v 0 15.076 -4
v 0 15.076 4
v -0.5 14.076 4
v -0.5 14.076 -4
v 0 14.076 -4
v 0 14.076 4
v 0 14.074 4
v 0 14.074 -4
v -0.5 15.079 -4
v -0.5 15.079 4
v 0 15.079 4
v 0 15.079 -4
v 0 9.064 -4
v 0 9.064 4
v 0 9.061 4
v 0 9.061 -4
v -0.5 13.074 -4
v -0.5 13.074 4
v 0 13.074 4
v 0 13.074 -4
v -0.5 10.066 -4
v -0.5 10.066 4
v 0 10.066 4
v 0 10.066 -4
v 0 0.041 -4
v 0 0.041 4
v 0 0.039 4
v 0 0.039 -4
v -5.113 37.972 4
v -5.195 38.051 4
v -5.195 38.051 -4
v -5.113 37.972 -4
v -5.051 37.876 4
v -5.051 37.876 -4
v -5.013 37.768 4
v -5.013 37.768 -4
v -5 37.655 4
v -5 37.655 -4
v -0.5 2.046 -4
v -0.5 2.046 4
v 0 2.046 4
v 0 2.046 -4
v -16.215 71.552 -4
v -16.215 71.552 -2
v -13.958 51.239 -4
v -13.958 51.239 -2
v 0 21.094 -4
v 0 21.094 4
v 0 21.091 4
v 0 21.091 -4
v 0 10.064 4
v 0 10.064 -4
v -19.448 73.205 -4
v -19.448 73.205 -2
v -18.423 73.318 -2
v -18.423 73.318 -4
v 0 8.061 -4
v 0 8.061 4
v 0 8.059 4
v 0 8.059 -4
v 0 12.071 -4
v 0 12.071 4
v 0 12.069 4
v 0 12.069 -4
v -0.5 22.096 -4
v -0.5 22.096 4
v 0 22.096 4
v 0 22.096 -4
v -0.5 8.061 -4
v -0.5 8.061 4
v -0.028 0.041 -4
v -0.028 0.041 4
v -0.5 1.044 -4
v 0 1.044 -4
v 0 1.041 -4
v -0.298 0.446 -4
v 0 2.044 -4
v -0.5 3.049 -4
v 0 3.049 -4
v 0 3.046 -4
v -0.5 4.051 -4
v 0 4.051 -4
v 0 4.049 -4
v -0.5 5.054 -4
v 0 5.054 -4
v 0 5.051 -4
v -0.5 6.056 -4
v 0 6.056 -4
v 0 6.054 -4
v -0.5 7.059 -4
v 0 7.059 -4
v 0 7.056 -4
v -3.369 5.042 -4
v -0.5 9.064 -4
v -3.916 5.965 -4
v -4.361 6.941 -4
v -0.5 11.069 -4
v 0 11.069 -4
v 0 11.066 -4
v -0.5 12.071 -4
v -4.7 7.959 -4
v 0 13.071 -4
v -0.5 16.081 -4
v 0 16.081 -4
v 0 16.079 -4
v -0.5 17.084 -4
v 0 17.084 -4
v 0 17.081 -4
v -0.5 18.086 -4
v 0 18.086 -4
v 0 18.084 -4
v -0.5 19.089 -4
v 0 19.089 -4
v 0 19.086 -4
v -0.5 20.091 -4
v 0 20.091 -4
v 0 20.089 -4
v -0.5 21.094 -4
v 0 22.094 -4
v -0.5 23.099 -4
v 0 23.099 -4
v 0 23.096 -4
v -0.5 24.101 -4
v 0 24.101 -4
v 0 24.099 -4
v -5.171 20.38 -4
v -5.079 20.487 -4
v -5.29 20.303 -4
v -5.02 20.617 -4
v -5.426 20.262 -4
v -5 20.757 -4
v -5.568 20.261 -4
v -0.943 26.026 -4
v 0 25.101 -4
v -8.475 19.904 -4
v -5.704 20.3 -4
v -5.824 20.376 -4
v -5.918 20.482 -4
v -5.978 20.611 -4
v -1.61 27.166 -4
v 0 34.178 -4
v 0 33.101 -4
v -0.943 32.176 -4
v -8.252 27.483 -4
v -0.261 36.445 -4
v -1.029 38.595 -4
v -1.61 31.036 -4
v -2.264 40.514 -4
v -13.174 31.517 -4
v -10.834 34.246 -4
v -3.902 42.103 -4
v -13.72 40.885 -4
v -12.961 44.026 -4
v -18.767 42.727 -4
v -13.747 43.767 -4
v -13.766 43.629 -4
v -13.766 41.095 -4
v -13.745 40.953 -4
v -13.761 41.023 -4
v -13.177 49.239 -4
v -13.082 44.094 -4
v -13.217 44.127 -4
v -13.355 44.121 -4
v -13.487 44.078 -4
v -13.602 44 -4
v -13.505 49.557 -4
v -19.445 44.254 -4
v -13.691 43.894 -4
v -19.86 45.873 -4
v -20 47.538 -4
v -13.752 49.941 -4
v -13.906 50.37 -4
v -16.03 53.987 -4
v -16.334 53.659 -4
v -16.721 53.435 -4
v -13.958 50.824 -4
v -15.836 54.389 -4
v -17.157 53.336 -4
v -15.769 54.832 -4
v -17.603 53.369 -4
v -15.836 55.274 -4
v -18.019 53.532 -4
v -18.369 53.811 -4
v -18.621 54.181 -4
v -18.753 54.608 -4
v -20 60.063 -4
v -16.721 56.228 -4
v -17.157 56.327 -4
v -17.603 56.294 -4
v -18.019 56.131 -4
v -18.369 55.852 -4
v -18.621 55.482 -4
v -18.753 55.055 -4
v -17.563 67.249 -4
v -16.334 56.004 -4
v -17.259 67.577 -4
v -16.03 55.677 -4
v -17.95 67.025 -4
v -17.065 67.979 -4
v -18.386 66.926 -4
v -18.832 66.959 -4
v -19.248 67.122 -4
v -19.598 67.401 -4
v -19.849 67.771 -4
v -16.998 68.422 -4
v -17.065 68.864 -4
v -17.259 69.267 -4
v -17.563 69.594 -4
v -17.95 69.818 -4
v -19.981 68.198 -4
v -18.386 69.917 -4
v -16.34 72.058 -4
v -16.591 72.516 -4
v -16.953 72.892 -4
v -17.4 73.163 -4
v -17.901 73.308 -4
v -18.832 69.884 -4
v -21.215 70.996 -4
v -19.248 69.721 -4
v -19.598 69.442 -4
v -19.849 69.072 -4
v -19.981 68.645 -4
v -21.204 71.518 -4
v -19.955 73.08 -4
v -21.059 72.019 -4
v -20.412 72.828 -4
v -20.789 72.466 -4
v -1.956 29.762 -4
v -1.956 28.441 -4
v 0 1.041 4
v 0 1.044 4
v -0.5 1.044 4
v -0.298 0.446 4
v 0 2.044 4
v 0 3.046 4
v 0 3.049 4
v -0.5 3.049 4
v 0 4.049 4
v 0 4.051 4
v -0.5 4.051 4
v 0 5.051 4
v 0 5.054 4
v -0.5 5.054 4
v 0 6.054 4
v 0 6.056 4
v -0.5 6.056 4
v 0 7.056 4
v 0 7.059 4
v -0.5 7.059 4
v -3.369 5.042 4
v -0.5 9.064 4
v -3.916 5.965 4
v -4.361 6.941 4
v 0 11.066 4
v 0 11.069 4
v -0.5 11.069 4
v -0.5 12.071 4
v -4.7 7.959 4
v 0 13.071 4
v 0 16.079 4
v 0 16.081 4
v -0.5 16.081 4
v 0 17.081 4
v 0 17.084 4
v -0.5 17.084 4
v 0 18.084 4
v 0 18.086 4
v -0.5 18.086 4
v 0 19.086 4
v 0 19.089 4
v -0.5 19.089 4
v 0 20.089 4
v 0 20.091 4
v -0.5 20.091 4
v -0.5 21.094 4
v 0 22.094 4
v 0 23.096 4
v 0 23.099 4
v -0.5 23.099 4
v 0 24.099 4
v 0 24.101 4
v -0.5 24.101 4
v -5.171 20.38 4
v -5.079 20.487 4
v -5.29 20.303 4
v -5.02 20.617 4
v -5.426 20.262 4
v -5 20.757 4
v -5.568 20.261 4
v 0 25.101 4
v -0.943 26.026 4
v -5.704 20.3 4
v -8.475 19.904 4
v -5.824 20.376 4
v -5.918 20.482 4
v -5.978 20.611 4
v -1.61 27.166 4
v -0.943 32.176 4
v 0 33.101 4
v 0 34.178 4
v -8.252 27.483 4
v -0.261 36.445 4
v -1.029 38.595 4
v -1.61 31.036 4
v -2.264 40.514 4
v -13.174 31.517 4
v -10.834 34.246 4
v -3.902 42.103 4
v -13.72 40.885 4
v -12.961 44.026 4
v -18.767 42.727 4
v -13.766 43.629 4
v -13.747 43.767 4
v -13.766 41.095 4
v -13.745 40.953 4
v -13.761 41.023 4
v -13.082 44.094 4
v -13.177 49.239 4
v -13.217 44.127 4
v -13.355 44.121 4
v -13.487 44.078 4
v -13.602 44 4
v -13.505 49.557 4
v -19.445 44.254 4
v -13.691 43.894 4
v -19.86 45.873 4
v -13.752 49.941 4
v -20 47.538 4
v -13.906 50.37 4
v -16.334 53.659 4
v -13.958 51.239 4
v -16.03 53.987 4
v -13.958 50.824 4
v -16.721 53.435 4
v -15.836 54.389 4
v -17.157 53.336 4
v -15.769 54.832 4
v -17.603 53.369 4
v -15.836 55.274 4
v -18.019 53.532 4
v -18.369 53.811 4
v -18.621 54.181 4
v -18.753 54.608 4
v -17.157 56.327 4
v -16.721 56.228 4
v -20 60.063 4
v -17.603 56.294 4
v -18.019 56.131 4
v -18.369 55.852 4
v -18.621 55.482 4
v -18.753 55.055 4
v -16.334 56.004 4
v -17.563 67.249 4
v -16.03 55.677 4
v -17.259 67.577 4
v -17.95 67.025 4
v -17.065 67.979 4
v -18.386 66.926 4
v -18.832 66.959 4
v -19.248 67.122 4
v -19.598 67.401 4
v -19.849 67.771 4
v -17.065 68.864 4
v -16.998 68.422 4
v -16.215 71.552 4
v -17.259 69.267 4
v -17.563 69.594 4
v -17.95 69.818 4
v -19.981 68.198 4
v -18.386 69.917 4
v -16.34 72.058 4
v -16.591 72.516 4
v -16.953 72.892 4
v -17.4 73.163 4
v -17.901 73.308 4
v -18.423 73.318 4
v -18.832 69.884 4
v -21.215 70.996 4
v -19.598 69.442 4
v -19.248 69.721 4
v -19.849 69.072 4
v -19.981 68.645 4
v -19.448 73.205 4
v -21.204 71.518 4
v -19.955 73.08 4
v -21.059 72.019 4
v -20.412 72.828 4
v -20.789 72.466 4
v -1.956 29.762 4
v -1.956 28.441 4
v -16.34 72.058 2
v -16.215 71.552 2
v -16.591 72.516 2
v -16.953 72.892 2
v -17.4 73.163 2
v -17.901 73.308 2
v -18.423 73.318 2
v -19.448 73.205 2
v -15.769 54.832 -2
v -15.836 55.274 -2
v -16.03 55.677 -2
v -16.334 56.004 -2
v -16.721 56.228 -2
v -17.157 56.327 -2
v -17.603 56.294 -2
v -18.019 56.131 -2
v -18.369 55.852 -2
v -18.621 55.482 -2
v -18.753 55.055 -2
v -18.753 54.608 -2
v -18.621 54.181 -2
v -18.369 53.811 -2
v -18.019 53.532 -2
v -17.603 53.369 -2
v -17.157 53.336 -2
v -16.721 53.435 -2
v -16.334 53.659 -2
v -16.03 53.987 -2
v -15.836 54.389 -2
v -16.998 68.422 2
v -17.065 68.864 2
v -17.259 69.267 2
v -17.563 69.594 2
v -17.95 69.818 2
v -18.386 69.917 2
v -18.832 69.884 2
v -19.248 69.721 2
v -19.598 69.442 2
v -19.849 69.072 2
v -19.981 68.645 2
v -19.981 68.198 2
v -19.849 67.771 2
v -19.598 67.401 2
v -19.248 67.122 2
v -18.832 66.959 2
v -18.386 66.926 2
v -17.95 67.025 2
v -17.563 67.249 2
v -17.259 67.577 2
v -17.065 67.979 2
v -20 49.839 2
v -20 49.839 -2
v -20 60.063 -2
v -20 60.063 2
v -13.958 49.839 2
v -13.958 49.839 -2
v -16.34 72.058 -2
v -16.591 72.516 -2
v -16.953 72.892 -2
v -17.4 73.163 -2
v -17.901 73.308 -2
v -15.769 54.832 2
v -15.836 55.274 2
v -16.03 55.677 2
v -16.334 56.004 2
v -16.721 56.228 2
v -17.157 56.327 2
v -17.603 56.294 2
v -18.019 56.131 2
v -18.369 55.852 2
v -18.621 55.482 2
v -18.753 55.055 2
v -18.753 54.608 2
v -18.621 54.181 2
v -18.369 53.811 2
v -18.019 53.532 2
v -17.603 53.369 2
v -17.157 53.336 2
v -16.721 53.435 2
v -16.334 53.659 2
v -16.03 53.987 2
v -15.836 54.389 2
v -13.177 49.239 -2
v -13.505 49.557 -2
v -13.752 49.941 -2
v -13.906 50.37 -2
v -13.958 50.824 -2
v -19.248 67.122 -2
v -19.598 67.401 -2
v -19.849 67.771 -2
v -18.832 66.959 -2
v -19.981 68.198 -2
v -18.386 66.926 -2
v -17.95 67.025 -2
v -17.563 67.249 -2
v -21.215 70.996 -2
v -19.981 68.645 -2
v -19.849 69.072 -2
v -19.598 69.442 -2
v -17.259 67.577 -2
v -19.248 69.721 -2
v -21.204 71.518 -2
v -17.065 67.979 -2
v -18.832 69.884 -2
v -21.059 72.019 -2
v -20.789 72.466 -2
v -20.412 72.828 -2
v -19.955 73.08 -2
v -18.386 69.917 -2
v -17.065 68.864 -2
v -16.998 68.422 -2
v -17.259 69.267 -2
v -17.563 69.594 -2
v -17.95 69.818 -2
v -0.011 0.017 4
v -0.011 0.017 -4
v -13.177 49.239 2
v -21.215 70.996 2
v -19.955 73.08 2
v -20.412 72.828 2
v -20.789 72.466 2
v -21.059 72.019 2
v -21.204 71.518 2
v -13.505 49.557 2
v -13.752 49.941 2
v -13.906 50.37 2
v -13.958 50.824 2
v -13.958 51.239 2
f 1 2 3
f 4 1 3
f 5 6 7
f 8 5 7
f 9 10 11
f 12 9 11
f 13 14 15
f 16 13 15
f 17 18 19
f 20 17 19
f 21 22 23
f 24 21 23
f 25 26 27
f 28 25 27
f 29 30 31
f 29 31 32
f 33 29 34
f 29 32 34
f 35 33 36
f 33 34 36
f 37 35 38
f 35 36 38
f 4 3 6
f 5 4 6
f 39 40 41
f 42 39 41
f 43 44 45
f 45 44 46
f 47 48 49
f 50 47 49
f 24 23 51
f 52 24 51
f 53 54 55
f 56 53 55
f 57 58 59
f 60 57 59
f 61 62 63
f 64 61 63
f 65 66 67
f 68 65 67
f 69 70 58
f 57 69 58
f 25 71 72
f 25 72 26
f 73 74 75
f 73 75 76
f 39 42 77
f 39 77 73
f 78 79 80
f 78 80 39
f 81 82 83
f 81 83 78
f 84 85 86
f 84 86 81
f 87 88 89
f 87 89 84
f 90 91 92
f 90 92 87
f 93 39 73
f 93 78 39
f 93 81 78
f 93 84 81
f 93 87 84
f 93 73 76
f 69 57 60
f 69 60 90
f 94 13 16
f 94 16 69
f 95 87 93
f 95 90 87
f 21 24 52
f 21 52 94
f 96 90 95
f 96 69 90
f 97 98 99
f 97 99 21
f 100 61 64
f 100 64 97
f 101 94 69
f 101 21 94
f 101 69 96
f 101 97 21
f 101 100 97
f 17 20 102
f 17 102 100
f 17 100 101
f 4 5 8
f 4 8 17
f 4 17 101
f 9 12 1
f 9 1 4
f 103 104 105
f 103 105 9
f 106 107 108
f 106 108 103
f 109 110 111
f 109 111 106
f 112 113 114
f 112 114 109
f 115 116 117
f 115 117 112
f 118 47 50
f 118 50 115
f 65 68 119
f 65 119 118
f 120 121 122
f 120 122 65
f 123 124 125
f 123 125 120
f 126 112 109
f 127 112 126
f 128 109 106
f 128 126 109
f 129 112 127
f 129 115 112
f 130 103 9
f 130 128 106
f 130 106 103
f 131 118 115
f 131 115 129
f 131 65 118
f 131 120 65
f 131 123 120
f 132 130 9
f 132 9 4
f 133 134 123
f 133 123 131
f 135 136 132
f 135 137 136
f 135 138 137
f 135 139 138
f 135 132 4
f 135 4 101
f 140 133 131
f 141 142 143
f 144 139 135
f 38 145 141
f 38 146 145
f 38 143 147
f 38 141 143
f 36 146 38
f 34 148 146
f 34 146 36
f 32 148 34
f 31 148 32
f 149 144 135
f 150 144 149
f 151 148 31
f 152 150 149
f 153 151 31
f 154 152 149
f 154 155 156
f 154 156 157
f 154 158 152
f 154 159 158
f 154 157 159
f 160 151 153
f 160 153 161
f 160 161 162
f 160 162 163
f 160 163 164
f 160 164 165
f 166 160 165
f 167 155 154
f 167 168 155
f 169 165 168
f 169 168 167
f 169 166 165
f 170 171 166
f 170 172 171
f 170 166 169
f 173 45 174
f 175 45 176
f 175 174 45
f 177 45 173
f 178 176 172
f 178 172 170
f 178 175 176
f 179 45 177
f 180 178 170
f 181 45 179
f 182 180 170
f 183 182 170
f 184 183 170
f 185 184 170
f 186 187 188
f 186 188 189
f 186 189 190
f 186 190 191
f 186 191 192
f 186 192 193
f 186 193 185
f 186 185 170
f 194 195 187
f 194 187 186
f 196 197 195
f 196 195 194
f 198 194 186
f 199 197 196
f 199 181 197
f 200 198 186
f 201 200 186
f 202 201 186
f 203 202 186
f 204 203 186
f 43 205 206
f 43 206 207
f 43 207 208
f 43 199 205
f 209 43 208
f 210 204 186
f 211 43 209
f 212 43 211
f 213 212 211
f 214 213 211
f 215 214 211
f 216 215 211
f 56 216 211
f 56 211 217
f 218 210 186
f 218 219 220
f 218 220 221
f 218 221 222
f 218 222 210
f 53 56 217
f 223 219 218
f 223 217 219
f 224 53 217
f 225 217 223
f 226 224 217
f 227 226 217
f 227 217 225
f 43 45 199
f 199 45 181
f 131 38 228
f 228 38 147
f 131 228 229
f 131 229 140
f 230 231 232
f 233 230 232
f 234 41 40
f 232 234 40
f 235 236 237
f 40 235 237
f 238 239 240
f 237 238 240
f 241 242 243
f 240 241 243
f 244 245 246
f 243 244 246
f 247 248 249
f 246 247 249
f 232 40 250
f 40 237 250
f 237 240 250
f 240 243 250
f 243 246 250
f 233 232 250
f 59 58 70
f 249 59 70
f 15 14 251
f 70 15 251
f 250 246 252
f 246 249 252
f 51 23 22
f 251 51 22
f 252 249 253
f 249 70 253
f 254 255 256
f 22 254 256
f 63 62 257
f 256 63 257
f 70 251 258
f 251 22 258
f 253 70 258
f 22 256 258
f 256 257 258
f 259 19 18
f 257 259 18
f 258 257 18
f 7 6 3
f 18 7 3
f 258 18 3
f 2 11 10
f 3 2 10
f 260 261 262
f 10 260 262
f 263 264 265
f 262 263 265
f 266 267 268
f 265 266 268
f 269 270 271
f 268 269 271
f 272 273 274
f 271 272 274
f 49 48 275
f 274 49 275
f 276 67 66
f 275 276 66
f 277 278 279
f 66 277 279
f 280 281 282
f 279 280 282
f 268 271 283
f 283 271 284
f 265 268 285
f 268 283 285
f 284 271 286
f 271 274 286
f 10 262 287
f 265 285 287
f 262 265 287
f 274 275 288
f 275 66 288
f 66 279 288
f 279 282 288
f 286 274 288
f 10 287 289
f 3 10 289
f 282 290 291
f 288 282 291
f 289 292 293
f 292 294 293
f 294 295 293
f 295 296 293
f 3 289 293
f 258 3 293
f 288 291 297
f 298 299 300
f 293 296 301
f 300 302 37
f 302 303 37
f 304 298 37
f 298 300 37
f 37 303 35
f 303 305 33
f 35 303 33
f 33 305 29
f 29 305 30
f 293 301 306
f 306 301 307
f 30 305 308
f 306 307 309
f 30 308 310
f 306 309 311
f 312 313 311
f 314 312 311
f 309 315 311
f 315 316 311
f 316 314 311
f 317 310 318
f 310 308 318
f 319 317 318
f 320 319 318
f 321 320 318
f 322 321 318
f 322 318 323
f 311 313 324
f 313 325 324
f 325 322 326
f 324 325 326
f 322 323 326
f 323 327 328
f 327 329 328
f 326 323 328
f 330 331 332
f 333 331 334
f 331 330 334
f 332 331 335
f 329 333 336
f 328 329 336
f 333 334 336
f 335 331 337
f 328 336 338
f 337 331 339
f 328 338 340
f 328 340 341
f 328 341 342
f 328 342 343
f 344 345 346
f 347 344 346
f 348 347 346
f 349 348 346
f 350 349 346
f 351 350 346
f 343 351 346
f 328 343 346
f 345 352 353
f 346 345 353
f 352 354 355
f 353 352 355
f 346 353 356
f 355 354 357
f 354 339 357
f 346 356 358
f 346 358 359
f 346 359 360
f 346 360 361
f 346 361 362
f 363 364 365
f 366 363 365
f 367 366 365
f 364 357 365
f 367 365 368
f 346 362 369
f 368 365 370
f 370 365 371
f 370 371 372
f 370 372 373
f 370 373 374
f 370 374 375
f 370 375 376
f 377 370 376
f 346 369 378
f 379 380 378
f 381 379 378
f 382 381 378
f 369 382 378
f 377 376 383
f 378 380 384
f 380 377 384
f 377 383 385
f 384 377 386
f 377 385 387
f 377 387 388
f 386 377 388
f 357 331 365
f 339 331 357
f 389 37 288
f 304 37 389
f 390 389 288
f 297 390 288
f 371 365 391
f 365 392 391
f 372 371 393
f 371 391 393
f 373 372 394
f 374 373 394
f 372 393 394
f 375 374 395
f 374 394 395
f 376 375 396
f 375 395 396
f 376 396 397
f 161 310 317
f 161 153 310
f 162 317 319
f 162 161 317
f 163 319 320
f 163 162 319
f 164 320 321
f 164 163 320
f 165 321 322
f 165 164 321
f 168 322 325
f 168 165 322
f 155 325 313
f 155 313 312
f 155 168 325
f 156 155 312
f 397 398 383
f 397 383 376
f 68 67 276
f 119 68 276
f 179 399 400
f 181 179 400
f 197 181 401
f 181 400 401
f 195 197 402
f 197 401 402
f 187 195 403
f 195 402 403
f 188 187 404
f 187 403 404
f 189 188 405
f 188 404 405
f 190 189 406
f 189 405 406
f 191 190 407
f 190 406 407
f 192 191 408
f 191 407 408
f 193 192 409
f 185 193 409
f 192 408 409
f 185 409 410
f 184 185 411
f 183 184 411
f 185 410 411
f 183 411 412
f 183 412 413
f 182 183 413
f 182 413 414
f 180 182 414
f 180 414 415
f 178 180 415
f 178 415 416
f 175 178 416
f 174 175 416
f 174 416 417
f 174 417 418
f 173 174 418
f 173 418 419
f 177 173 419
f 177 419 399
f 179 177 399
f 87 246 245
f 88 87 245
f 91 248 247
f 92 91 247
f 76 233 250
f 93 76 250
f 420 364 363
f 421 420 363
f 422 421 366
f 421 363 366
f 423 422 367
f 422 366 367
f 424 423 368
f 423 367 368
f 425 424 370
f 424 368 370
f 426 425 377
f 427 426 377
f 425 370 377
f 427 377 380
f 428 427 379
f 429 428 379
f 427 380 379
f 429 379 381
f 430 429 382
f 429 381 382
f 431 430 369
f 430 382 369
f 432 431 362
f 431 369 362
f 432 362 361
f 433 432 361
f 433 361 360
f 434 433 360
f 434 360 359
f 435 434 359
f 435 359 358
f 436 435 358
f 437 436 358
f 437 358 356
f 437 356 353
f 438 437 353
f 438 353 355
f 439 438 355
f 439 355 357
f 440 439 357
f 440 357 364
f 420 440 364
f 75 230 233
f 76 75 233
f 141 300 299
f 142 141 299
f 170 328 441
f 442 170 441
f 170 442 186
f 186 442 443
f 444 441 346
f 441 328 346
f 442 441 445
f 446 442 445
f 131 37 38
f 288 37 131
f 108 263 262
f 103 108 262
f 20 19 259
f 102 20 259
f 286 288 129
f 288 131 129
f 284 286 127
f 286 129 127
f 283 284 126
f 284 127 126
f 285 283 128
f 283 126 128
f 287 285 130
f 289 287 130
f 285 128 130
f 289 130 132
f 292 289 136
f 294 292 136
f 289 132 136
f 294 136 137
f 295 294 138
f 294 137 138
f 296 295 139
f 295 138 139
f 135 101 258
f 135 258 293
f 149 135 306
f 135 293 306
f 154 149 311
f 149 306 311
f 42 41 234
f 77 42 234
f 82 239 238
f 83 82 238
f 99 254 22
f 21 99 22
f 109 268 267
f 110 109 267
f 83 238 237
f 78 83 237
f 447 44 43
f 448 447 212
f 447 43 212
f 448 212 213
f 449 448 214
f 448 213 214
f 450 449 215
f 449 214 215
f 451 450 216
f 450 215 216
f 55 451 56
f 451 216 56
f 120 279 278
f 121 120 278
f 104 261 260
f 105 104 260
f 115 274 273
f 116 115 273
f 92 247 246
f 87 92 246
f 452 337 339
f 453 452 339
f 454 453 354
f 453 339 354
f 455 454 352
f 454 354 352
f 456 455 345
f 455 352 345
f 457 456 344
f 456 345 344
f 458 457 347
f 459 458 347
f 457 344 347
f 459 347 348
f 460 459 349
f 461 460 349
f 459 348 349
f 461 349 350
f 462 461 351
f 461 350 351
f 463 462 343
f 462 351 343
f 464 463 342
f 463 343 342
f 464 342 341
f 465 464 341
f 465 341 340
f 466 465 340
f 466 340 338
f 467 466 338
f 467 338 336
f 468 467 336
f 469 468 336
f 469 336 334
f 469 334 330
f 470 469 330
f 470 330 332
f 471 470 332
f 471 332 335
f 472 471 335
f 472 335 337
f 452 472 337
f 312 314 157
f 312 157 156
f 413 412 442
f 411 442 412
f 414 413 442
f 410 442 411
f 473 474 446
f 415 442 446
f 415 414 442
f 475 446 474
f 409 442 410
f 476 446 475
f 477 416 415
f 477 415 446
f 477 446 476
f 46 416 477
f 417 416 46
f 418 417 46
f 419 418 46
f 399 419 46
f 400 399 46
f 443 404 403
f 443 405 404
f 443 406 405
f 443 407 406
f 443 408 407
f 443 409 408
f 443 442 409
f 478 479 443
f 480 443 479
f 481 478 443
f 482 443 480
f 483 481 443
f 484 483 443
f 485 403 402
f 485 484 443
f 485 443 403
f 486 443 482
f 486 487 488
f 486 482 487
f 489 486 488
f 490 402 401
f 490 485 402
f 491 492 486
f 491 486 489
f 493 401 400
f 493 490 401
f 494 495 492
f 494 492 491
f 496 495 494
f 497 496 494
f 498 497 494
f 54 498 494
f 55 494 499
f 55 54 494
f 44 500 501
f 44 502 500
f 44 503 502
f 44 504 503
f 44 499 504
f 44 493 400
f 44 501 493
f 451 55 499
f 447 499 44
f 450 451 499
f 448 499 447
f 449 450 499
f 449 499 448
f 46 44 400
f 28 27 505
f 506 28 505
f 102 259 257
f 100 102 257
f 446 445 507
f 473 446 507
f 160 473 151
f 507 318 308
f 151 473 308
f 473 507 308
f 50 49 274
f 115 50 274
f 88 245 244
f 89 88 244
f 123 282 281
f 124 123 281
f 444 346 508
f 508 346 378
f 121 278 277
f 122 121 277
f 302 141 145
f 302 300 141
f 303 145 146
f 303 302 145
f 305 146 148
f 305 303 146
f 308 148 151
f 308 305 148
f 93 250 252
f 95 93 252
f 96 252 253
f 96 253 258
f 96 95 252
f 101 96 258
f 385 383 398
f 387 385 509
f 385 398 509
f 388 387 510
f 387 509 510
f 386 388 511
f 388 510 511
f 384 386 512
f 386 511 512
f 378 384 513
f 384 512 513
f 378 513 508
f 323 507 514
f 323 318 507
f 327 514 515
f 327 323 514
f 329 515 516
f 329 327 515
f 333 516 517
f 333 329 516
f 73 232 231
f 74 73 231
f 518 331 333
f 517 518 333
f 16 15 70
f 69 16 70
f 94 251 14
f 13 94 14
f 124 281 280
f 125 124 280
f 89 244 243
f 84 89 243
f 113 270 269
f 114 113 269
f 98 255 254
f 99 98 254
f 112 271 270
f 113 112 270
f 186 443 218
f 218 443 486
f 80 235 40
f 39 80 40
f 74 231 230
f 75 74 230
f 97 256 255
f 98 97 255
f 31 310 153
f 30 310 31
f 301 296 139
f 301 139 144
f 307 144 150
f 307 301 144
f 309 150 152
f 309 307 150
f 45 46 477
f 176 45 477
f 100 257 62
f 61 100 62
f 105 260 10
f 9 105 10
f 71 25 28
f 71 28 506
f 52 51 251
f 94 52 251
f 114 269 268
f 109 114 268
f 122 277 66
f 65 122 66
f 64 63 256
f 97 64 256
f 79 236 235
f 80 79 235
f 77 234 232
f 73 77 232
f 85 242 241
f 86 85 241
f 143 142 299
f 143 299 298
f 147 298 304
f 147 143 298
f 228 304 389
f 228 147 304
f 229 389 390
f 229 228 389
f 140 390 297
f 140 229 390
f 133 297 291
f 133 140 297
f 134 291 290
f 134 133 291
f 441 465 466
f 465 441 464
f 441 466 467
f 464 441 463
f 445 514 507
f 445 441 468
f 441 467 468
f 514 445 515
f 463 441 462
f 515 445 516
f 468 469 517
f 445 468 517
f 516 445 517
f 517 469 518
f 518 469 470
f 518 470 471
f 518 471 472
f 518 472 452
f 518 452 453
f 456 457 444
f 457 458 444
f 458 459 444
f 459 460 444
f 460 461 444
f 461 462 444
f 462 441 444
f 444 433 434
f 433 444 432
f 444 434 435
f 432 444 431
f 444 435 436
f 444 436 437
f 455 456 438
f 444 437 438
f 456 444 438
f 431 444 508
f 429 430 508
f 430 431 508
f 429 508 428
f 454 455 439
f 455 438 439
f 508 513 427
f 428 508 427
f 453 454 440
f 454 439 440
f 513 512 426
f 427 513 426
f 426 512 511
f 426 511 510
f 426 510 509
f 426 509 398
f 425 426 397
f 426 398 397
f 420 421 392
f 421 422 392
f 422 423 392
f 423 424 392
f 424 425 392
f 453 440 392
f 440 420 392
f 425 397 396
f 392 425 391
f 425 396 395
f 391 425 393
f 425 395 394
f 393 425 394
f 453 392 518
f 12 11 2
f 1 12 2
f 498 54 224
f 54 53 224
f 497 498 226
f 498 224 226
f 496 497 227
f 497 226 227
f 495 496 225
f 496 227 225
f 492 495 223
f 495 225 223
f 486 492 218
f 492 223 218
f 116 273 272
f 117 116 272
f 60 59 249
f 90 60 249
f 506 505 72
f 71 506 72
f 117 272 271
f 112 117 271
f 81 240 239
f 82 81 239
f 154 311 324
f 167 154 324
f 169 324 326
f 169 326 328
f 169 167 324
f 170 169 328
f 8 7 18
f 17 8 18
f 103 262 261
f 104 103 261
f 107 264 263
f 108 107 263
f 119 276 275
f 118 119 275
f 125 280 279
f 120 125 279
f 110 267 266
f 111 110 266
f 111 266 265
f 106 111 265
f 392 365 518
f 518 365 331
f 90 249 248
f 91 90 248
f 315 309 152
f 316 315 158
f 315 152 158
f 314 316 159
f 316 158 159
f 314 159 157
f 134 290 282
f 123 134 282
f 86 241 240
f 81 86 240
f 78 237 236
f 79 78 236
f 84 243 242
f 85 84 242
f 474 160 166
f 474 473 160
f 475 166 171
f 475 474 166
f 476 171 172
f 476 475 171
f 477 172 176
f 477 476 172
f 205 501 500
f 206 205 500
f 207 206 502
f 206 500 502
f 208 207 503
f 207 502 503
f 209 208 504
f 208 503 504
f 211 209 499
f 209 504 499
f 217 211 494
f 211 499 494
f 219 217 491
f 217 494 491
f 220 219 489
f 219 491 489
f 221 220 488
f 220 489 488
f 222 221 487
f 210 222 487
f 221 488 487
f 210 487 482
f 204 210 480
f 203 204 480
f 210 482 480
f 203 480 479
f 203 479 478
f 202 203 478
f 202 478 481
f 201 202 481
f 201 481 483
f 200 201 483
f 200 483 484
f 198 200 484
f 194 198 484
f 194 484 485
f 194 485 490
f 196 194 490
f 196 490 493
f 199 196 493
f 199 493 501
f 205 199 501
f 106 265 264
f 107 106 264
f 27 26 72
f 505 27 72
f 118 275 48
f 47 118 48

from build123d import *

# Parameters (mm, degrees)
BOSS_EXTRUDE1_DEPTH     = 4
SKETCH2_W               = 20
SKETCH2_H               = 25
CUT_EXTRUDE1_DEPTH      = 2
CUT_EXTRUDE2_DEPTH      = 78.016302468
CUT_EXTRUDE2_DEPTH_BACK = 78.016302468
CUT_EXTRUDE3_DEPTH      = 78.016302468
LPATTERN1_COUNT         = 26
LPATTERN1_PITCH         = 1.0025
CUT_EXTRUDE4_DEPTH      = 78.016302468
CUT_EXTRUDE5_DEPTH      = 78.016302468
FILLET1_R               = 10
FILLET2_R               = 2
FILLET3_R               = 0.5
SKETCH8_R               = 1.5
CUT_EXTRUDE6_DEPTH      = 77.75916694


with BuildPart() as part:
    # Sketch1 → Boss-Extrude1 (new, symmetric)
    with BuildSketch(Plane.XY):
        Polygon((0, 0), (-20, 29.933259094), (-20, 60.063259094), (-21.435566599, 72.983752449), (-16.435566599, 73.539291065), (-13.957864372, 51.239291065), (-13.957864372, 49.839291065), (0, 39.101256812), align=None)
    extrude(amount=BOSS_EXTRUDE1_DEPTH, both=True)

    # Sketch2 → Cut-Extrude1 (cut, symmetric)
    with BuildSketch(Plane.XY):
        with Locations((-23.957864372, 62.339291065)):
            Rectangle(SKETCH2_W, SKETCH2_H)
    extrude(amount=CUT_EXTRUDE1_DEPTH, both=True, mode=Mode.SUBTRACT)

    # Sketch3 → Cut-Extrude2 (cut, two sides: drawn at the far end of the back side and taken through both)
    with BuildSketch(Plane.XY.offset(4).offset(-CUT_EXTRUDE2_DEPTH_BACK)):
        with BuildLine():
            Line((92.75057696, 102.664189532), (0, 33.101256812))
            ThreePointArc((0, 33.101256812), (-2, 29.101256812), (0, 25.101256812))
            Line((0, 25.101256812), (92.75057696, -44.461675908))
            Line((92.75057696, -44.461675908), (324.62701936, -44.461675908))
            Line((324.62701936, -44.461675908), (324.62701936, 102.664189532))
            Line((324.62701936, 102.664189532), (92.75057696, 102.664189532))
        make_face()
    extrude(amount=CUT_EXTRUDE2_DEPTH + CUT_EXTRUDE2_DEPTH_BACK, mode=Mode.SUBTRACT)

    # Sketch5 → Cut-Extrude3 (cut, through all)
    with BuildSketch(Plane.XY.offset(4)):
        Polygon((0, 25.101256812), (-0.5, 24.101256812), (0, 24.101256812), align=None)
    cut_extrude3 = extrude(amount=-CUT_EXTRUDE3_DEPTH, mode=Mode.SUBTRACT)

    # LPattern1: Cut-Extrude3 ×26
    with Locations(*[(0, -i * LPATTERN1_PITCH, 0) for i in range(1, LPATTERN1_COUNT)]):
        add(cut_extrude3, mode=Mode.SUBTRACT)

    # Sketch6 → Cut-Extrude4 (cut, through all)
    with BuildSketch(Plane.XY.offset(4)):
        with BuildLine():
            Line((-20, 44.933259094), (-20, 29.933259094))
            Line((-20, 29.933259094), (-4.285038976, 6.413259094))
            ThreePointArc((-4.285038976, 6.413259094), (-10.885215286, 26.186200074), (-20, 44.933259094))
        make_face()
    extrude(amount=-CUT_EXTRUDE4_DEPTH, mode=Mode.SUBTRACT)

    # Sketch7 → Cut-Extrude5 (cut, through all)
    with BuildSketch(Plane.XY.offset(4)):
        with BuildLine():
            Line((-13.766052386, 44.644985221), (-5, 37.901104619))
            Line((-5, 37.901104619), (-5, 17.284985221))
            ThreePointArc((-5, 17.284985221), (-8.914419056, 29.30831158), (-13.766052386, 40.984985221))
            Line((-13.766052386, 40.984985221), (-13.766052386, 44.644985221))
        make_face()
    extrude(amount=-CUT_EXTRUDE5_DEPTH, mode=Mode.SUBTRACT)

    # Fillet1
    fillet1_edges = [part.edges().sort_by_distance(p)[0] for p in [
        (-20, 44.933259094, 0),
        (-4.285038976, 6.413259094, 0),
        (0, 39.101256812, 0),
    ]]
    fillet(fillet1_edges, radius=FILLET1_R)

    # Fillet2
    fillet2_edges = [part.edges().sort_by_distance(p)[0] for p in [
        (-13.957864372, 49.839291065, -3),
        (-16.435566599, 73.539291065, -3),
        (-21.435566599, 72.983752449, -3),
        (-13.957864372, 49.839291065, 3),
        (-16.435566599, 73.539291065, 3),
        (-21.435566599, 72.983752449, 3),
    ]]
    fillet(fillet2_edges, radius=FILLET2_R)

    # Fillet3
    fillet3_edges = [part.edges().sort_by_distance(p)[0] for p in [
        (-13.766052386, 40.984985221, 0),
        (-13.766052386, 44.644985221, 0),
        (-5, 37.901104619, 0),
        (-5, 17.284985221, 0),
    ]]
    fillet(fillet3_edges, radius=FILLET3_R)

    # Sketch8 → Cut-Extrude6 (cut, through all)
    with BuildSketch(Plane.XY.offset(4)):
        with Locations((-18.498023971, 68.421521757)):
            Circle(SKETCH8_R)
        with Locations((-17.26946936, 54.831521757)):
            Circle(SKETCH8_R)
    extrude(amount=-CUT_EXTRUDE6_DEPTH, mode=Mode.SUBTRACT)


solid = part.part
